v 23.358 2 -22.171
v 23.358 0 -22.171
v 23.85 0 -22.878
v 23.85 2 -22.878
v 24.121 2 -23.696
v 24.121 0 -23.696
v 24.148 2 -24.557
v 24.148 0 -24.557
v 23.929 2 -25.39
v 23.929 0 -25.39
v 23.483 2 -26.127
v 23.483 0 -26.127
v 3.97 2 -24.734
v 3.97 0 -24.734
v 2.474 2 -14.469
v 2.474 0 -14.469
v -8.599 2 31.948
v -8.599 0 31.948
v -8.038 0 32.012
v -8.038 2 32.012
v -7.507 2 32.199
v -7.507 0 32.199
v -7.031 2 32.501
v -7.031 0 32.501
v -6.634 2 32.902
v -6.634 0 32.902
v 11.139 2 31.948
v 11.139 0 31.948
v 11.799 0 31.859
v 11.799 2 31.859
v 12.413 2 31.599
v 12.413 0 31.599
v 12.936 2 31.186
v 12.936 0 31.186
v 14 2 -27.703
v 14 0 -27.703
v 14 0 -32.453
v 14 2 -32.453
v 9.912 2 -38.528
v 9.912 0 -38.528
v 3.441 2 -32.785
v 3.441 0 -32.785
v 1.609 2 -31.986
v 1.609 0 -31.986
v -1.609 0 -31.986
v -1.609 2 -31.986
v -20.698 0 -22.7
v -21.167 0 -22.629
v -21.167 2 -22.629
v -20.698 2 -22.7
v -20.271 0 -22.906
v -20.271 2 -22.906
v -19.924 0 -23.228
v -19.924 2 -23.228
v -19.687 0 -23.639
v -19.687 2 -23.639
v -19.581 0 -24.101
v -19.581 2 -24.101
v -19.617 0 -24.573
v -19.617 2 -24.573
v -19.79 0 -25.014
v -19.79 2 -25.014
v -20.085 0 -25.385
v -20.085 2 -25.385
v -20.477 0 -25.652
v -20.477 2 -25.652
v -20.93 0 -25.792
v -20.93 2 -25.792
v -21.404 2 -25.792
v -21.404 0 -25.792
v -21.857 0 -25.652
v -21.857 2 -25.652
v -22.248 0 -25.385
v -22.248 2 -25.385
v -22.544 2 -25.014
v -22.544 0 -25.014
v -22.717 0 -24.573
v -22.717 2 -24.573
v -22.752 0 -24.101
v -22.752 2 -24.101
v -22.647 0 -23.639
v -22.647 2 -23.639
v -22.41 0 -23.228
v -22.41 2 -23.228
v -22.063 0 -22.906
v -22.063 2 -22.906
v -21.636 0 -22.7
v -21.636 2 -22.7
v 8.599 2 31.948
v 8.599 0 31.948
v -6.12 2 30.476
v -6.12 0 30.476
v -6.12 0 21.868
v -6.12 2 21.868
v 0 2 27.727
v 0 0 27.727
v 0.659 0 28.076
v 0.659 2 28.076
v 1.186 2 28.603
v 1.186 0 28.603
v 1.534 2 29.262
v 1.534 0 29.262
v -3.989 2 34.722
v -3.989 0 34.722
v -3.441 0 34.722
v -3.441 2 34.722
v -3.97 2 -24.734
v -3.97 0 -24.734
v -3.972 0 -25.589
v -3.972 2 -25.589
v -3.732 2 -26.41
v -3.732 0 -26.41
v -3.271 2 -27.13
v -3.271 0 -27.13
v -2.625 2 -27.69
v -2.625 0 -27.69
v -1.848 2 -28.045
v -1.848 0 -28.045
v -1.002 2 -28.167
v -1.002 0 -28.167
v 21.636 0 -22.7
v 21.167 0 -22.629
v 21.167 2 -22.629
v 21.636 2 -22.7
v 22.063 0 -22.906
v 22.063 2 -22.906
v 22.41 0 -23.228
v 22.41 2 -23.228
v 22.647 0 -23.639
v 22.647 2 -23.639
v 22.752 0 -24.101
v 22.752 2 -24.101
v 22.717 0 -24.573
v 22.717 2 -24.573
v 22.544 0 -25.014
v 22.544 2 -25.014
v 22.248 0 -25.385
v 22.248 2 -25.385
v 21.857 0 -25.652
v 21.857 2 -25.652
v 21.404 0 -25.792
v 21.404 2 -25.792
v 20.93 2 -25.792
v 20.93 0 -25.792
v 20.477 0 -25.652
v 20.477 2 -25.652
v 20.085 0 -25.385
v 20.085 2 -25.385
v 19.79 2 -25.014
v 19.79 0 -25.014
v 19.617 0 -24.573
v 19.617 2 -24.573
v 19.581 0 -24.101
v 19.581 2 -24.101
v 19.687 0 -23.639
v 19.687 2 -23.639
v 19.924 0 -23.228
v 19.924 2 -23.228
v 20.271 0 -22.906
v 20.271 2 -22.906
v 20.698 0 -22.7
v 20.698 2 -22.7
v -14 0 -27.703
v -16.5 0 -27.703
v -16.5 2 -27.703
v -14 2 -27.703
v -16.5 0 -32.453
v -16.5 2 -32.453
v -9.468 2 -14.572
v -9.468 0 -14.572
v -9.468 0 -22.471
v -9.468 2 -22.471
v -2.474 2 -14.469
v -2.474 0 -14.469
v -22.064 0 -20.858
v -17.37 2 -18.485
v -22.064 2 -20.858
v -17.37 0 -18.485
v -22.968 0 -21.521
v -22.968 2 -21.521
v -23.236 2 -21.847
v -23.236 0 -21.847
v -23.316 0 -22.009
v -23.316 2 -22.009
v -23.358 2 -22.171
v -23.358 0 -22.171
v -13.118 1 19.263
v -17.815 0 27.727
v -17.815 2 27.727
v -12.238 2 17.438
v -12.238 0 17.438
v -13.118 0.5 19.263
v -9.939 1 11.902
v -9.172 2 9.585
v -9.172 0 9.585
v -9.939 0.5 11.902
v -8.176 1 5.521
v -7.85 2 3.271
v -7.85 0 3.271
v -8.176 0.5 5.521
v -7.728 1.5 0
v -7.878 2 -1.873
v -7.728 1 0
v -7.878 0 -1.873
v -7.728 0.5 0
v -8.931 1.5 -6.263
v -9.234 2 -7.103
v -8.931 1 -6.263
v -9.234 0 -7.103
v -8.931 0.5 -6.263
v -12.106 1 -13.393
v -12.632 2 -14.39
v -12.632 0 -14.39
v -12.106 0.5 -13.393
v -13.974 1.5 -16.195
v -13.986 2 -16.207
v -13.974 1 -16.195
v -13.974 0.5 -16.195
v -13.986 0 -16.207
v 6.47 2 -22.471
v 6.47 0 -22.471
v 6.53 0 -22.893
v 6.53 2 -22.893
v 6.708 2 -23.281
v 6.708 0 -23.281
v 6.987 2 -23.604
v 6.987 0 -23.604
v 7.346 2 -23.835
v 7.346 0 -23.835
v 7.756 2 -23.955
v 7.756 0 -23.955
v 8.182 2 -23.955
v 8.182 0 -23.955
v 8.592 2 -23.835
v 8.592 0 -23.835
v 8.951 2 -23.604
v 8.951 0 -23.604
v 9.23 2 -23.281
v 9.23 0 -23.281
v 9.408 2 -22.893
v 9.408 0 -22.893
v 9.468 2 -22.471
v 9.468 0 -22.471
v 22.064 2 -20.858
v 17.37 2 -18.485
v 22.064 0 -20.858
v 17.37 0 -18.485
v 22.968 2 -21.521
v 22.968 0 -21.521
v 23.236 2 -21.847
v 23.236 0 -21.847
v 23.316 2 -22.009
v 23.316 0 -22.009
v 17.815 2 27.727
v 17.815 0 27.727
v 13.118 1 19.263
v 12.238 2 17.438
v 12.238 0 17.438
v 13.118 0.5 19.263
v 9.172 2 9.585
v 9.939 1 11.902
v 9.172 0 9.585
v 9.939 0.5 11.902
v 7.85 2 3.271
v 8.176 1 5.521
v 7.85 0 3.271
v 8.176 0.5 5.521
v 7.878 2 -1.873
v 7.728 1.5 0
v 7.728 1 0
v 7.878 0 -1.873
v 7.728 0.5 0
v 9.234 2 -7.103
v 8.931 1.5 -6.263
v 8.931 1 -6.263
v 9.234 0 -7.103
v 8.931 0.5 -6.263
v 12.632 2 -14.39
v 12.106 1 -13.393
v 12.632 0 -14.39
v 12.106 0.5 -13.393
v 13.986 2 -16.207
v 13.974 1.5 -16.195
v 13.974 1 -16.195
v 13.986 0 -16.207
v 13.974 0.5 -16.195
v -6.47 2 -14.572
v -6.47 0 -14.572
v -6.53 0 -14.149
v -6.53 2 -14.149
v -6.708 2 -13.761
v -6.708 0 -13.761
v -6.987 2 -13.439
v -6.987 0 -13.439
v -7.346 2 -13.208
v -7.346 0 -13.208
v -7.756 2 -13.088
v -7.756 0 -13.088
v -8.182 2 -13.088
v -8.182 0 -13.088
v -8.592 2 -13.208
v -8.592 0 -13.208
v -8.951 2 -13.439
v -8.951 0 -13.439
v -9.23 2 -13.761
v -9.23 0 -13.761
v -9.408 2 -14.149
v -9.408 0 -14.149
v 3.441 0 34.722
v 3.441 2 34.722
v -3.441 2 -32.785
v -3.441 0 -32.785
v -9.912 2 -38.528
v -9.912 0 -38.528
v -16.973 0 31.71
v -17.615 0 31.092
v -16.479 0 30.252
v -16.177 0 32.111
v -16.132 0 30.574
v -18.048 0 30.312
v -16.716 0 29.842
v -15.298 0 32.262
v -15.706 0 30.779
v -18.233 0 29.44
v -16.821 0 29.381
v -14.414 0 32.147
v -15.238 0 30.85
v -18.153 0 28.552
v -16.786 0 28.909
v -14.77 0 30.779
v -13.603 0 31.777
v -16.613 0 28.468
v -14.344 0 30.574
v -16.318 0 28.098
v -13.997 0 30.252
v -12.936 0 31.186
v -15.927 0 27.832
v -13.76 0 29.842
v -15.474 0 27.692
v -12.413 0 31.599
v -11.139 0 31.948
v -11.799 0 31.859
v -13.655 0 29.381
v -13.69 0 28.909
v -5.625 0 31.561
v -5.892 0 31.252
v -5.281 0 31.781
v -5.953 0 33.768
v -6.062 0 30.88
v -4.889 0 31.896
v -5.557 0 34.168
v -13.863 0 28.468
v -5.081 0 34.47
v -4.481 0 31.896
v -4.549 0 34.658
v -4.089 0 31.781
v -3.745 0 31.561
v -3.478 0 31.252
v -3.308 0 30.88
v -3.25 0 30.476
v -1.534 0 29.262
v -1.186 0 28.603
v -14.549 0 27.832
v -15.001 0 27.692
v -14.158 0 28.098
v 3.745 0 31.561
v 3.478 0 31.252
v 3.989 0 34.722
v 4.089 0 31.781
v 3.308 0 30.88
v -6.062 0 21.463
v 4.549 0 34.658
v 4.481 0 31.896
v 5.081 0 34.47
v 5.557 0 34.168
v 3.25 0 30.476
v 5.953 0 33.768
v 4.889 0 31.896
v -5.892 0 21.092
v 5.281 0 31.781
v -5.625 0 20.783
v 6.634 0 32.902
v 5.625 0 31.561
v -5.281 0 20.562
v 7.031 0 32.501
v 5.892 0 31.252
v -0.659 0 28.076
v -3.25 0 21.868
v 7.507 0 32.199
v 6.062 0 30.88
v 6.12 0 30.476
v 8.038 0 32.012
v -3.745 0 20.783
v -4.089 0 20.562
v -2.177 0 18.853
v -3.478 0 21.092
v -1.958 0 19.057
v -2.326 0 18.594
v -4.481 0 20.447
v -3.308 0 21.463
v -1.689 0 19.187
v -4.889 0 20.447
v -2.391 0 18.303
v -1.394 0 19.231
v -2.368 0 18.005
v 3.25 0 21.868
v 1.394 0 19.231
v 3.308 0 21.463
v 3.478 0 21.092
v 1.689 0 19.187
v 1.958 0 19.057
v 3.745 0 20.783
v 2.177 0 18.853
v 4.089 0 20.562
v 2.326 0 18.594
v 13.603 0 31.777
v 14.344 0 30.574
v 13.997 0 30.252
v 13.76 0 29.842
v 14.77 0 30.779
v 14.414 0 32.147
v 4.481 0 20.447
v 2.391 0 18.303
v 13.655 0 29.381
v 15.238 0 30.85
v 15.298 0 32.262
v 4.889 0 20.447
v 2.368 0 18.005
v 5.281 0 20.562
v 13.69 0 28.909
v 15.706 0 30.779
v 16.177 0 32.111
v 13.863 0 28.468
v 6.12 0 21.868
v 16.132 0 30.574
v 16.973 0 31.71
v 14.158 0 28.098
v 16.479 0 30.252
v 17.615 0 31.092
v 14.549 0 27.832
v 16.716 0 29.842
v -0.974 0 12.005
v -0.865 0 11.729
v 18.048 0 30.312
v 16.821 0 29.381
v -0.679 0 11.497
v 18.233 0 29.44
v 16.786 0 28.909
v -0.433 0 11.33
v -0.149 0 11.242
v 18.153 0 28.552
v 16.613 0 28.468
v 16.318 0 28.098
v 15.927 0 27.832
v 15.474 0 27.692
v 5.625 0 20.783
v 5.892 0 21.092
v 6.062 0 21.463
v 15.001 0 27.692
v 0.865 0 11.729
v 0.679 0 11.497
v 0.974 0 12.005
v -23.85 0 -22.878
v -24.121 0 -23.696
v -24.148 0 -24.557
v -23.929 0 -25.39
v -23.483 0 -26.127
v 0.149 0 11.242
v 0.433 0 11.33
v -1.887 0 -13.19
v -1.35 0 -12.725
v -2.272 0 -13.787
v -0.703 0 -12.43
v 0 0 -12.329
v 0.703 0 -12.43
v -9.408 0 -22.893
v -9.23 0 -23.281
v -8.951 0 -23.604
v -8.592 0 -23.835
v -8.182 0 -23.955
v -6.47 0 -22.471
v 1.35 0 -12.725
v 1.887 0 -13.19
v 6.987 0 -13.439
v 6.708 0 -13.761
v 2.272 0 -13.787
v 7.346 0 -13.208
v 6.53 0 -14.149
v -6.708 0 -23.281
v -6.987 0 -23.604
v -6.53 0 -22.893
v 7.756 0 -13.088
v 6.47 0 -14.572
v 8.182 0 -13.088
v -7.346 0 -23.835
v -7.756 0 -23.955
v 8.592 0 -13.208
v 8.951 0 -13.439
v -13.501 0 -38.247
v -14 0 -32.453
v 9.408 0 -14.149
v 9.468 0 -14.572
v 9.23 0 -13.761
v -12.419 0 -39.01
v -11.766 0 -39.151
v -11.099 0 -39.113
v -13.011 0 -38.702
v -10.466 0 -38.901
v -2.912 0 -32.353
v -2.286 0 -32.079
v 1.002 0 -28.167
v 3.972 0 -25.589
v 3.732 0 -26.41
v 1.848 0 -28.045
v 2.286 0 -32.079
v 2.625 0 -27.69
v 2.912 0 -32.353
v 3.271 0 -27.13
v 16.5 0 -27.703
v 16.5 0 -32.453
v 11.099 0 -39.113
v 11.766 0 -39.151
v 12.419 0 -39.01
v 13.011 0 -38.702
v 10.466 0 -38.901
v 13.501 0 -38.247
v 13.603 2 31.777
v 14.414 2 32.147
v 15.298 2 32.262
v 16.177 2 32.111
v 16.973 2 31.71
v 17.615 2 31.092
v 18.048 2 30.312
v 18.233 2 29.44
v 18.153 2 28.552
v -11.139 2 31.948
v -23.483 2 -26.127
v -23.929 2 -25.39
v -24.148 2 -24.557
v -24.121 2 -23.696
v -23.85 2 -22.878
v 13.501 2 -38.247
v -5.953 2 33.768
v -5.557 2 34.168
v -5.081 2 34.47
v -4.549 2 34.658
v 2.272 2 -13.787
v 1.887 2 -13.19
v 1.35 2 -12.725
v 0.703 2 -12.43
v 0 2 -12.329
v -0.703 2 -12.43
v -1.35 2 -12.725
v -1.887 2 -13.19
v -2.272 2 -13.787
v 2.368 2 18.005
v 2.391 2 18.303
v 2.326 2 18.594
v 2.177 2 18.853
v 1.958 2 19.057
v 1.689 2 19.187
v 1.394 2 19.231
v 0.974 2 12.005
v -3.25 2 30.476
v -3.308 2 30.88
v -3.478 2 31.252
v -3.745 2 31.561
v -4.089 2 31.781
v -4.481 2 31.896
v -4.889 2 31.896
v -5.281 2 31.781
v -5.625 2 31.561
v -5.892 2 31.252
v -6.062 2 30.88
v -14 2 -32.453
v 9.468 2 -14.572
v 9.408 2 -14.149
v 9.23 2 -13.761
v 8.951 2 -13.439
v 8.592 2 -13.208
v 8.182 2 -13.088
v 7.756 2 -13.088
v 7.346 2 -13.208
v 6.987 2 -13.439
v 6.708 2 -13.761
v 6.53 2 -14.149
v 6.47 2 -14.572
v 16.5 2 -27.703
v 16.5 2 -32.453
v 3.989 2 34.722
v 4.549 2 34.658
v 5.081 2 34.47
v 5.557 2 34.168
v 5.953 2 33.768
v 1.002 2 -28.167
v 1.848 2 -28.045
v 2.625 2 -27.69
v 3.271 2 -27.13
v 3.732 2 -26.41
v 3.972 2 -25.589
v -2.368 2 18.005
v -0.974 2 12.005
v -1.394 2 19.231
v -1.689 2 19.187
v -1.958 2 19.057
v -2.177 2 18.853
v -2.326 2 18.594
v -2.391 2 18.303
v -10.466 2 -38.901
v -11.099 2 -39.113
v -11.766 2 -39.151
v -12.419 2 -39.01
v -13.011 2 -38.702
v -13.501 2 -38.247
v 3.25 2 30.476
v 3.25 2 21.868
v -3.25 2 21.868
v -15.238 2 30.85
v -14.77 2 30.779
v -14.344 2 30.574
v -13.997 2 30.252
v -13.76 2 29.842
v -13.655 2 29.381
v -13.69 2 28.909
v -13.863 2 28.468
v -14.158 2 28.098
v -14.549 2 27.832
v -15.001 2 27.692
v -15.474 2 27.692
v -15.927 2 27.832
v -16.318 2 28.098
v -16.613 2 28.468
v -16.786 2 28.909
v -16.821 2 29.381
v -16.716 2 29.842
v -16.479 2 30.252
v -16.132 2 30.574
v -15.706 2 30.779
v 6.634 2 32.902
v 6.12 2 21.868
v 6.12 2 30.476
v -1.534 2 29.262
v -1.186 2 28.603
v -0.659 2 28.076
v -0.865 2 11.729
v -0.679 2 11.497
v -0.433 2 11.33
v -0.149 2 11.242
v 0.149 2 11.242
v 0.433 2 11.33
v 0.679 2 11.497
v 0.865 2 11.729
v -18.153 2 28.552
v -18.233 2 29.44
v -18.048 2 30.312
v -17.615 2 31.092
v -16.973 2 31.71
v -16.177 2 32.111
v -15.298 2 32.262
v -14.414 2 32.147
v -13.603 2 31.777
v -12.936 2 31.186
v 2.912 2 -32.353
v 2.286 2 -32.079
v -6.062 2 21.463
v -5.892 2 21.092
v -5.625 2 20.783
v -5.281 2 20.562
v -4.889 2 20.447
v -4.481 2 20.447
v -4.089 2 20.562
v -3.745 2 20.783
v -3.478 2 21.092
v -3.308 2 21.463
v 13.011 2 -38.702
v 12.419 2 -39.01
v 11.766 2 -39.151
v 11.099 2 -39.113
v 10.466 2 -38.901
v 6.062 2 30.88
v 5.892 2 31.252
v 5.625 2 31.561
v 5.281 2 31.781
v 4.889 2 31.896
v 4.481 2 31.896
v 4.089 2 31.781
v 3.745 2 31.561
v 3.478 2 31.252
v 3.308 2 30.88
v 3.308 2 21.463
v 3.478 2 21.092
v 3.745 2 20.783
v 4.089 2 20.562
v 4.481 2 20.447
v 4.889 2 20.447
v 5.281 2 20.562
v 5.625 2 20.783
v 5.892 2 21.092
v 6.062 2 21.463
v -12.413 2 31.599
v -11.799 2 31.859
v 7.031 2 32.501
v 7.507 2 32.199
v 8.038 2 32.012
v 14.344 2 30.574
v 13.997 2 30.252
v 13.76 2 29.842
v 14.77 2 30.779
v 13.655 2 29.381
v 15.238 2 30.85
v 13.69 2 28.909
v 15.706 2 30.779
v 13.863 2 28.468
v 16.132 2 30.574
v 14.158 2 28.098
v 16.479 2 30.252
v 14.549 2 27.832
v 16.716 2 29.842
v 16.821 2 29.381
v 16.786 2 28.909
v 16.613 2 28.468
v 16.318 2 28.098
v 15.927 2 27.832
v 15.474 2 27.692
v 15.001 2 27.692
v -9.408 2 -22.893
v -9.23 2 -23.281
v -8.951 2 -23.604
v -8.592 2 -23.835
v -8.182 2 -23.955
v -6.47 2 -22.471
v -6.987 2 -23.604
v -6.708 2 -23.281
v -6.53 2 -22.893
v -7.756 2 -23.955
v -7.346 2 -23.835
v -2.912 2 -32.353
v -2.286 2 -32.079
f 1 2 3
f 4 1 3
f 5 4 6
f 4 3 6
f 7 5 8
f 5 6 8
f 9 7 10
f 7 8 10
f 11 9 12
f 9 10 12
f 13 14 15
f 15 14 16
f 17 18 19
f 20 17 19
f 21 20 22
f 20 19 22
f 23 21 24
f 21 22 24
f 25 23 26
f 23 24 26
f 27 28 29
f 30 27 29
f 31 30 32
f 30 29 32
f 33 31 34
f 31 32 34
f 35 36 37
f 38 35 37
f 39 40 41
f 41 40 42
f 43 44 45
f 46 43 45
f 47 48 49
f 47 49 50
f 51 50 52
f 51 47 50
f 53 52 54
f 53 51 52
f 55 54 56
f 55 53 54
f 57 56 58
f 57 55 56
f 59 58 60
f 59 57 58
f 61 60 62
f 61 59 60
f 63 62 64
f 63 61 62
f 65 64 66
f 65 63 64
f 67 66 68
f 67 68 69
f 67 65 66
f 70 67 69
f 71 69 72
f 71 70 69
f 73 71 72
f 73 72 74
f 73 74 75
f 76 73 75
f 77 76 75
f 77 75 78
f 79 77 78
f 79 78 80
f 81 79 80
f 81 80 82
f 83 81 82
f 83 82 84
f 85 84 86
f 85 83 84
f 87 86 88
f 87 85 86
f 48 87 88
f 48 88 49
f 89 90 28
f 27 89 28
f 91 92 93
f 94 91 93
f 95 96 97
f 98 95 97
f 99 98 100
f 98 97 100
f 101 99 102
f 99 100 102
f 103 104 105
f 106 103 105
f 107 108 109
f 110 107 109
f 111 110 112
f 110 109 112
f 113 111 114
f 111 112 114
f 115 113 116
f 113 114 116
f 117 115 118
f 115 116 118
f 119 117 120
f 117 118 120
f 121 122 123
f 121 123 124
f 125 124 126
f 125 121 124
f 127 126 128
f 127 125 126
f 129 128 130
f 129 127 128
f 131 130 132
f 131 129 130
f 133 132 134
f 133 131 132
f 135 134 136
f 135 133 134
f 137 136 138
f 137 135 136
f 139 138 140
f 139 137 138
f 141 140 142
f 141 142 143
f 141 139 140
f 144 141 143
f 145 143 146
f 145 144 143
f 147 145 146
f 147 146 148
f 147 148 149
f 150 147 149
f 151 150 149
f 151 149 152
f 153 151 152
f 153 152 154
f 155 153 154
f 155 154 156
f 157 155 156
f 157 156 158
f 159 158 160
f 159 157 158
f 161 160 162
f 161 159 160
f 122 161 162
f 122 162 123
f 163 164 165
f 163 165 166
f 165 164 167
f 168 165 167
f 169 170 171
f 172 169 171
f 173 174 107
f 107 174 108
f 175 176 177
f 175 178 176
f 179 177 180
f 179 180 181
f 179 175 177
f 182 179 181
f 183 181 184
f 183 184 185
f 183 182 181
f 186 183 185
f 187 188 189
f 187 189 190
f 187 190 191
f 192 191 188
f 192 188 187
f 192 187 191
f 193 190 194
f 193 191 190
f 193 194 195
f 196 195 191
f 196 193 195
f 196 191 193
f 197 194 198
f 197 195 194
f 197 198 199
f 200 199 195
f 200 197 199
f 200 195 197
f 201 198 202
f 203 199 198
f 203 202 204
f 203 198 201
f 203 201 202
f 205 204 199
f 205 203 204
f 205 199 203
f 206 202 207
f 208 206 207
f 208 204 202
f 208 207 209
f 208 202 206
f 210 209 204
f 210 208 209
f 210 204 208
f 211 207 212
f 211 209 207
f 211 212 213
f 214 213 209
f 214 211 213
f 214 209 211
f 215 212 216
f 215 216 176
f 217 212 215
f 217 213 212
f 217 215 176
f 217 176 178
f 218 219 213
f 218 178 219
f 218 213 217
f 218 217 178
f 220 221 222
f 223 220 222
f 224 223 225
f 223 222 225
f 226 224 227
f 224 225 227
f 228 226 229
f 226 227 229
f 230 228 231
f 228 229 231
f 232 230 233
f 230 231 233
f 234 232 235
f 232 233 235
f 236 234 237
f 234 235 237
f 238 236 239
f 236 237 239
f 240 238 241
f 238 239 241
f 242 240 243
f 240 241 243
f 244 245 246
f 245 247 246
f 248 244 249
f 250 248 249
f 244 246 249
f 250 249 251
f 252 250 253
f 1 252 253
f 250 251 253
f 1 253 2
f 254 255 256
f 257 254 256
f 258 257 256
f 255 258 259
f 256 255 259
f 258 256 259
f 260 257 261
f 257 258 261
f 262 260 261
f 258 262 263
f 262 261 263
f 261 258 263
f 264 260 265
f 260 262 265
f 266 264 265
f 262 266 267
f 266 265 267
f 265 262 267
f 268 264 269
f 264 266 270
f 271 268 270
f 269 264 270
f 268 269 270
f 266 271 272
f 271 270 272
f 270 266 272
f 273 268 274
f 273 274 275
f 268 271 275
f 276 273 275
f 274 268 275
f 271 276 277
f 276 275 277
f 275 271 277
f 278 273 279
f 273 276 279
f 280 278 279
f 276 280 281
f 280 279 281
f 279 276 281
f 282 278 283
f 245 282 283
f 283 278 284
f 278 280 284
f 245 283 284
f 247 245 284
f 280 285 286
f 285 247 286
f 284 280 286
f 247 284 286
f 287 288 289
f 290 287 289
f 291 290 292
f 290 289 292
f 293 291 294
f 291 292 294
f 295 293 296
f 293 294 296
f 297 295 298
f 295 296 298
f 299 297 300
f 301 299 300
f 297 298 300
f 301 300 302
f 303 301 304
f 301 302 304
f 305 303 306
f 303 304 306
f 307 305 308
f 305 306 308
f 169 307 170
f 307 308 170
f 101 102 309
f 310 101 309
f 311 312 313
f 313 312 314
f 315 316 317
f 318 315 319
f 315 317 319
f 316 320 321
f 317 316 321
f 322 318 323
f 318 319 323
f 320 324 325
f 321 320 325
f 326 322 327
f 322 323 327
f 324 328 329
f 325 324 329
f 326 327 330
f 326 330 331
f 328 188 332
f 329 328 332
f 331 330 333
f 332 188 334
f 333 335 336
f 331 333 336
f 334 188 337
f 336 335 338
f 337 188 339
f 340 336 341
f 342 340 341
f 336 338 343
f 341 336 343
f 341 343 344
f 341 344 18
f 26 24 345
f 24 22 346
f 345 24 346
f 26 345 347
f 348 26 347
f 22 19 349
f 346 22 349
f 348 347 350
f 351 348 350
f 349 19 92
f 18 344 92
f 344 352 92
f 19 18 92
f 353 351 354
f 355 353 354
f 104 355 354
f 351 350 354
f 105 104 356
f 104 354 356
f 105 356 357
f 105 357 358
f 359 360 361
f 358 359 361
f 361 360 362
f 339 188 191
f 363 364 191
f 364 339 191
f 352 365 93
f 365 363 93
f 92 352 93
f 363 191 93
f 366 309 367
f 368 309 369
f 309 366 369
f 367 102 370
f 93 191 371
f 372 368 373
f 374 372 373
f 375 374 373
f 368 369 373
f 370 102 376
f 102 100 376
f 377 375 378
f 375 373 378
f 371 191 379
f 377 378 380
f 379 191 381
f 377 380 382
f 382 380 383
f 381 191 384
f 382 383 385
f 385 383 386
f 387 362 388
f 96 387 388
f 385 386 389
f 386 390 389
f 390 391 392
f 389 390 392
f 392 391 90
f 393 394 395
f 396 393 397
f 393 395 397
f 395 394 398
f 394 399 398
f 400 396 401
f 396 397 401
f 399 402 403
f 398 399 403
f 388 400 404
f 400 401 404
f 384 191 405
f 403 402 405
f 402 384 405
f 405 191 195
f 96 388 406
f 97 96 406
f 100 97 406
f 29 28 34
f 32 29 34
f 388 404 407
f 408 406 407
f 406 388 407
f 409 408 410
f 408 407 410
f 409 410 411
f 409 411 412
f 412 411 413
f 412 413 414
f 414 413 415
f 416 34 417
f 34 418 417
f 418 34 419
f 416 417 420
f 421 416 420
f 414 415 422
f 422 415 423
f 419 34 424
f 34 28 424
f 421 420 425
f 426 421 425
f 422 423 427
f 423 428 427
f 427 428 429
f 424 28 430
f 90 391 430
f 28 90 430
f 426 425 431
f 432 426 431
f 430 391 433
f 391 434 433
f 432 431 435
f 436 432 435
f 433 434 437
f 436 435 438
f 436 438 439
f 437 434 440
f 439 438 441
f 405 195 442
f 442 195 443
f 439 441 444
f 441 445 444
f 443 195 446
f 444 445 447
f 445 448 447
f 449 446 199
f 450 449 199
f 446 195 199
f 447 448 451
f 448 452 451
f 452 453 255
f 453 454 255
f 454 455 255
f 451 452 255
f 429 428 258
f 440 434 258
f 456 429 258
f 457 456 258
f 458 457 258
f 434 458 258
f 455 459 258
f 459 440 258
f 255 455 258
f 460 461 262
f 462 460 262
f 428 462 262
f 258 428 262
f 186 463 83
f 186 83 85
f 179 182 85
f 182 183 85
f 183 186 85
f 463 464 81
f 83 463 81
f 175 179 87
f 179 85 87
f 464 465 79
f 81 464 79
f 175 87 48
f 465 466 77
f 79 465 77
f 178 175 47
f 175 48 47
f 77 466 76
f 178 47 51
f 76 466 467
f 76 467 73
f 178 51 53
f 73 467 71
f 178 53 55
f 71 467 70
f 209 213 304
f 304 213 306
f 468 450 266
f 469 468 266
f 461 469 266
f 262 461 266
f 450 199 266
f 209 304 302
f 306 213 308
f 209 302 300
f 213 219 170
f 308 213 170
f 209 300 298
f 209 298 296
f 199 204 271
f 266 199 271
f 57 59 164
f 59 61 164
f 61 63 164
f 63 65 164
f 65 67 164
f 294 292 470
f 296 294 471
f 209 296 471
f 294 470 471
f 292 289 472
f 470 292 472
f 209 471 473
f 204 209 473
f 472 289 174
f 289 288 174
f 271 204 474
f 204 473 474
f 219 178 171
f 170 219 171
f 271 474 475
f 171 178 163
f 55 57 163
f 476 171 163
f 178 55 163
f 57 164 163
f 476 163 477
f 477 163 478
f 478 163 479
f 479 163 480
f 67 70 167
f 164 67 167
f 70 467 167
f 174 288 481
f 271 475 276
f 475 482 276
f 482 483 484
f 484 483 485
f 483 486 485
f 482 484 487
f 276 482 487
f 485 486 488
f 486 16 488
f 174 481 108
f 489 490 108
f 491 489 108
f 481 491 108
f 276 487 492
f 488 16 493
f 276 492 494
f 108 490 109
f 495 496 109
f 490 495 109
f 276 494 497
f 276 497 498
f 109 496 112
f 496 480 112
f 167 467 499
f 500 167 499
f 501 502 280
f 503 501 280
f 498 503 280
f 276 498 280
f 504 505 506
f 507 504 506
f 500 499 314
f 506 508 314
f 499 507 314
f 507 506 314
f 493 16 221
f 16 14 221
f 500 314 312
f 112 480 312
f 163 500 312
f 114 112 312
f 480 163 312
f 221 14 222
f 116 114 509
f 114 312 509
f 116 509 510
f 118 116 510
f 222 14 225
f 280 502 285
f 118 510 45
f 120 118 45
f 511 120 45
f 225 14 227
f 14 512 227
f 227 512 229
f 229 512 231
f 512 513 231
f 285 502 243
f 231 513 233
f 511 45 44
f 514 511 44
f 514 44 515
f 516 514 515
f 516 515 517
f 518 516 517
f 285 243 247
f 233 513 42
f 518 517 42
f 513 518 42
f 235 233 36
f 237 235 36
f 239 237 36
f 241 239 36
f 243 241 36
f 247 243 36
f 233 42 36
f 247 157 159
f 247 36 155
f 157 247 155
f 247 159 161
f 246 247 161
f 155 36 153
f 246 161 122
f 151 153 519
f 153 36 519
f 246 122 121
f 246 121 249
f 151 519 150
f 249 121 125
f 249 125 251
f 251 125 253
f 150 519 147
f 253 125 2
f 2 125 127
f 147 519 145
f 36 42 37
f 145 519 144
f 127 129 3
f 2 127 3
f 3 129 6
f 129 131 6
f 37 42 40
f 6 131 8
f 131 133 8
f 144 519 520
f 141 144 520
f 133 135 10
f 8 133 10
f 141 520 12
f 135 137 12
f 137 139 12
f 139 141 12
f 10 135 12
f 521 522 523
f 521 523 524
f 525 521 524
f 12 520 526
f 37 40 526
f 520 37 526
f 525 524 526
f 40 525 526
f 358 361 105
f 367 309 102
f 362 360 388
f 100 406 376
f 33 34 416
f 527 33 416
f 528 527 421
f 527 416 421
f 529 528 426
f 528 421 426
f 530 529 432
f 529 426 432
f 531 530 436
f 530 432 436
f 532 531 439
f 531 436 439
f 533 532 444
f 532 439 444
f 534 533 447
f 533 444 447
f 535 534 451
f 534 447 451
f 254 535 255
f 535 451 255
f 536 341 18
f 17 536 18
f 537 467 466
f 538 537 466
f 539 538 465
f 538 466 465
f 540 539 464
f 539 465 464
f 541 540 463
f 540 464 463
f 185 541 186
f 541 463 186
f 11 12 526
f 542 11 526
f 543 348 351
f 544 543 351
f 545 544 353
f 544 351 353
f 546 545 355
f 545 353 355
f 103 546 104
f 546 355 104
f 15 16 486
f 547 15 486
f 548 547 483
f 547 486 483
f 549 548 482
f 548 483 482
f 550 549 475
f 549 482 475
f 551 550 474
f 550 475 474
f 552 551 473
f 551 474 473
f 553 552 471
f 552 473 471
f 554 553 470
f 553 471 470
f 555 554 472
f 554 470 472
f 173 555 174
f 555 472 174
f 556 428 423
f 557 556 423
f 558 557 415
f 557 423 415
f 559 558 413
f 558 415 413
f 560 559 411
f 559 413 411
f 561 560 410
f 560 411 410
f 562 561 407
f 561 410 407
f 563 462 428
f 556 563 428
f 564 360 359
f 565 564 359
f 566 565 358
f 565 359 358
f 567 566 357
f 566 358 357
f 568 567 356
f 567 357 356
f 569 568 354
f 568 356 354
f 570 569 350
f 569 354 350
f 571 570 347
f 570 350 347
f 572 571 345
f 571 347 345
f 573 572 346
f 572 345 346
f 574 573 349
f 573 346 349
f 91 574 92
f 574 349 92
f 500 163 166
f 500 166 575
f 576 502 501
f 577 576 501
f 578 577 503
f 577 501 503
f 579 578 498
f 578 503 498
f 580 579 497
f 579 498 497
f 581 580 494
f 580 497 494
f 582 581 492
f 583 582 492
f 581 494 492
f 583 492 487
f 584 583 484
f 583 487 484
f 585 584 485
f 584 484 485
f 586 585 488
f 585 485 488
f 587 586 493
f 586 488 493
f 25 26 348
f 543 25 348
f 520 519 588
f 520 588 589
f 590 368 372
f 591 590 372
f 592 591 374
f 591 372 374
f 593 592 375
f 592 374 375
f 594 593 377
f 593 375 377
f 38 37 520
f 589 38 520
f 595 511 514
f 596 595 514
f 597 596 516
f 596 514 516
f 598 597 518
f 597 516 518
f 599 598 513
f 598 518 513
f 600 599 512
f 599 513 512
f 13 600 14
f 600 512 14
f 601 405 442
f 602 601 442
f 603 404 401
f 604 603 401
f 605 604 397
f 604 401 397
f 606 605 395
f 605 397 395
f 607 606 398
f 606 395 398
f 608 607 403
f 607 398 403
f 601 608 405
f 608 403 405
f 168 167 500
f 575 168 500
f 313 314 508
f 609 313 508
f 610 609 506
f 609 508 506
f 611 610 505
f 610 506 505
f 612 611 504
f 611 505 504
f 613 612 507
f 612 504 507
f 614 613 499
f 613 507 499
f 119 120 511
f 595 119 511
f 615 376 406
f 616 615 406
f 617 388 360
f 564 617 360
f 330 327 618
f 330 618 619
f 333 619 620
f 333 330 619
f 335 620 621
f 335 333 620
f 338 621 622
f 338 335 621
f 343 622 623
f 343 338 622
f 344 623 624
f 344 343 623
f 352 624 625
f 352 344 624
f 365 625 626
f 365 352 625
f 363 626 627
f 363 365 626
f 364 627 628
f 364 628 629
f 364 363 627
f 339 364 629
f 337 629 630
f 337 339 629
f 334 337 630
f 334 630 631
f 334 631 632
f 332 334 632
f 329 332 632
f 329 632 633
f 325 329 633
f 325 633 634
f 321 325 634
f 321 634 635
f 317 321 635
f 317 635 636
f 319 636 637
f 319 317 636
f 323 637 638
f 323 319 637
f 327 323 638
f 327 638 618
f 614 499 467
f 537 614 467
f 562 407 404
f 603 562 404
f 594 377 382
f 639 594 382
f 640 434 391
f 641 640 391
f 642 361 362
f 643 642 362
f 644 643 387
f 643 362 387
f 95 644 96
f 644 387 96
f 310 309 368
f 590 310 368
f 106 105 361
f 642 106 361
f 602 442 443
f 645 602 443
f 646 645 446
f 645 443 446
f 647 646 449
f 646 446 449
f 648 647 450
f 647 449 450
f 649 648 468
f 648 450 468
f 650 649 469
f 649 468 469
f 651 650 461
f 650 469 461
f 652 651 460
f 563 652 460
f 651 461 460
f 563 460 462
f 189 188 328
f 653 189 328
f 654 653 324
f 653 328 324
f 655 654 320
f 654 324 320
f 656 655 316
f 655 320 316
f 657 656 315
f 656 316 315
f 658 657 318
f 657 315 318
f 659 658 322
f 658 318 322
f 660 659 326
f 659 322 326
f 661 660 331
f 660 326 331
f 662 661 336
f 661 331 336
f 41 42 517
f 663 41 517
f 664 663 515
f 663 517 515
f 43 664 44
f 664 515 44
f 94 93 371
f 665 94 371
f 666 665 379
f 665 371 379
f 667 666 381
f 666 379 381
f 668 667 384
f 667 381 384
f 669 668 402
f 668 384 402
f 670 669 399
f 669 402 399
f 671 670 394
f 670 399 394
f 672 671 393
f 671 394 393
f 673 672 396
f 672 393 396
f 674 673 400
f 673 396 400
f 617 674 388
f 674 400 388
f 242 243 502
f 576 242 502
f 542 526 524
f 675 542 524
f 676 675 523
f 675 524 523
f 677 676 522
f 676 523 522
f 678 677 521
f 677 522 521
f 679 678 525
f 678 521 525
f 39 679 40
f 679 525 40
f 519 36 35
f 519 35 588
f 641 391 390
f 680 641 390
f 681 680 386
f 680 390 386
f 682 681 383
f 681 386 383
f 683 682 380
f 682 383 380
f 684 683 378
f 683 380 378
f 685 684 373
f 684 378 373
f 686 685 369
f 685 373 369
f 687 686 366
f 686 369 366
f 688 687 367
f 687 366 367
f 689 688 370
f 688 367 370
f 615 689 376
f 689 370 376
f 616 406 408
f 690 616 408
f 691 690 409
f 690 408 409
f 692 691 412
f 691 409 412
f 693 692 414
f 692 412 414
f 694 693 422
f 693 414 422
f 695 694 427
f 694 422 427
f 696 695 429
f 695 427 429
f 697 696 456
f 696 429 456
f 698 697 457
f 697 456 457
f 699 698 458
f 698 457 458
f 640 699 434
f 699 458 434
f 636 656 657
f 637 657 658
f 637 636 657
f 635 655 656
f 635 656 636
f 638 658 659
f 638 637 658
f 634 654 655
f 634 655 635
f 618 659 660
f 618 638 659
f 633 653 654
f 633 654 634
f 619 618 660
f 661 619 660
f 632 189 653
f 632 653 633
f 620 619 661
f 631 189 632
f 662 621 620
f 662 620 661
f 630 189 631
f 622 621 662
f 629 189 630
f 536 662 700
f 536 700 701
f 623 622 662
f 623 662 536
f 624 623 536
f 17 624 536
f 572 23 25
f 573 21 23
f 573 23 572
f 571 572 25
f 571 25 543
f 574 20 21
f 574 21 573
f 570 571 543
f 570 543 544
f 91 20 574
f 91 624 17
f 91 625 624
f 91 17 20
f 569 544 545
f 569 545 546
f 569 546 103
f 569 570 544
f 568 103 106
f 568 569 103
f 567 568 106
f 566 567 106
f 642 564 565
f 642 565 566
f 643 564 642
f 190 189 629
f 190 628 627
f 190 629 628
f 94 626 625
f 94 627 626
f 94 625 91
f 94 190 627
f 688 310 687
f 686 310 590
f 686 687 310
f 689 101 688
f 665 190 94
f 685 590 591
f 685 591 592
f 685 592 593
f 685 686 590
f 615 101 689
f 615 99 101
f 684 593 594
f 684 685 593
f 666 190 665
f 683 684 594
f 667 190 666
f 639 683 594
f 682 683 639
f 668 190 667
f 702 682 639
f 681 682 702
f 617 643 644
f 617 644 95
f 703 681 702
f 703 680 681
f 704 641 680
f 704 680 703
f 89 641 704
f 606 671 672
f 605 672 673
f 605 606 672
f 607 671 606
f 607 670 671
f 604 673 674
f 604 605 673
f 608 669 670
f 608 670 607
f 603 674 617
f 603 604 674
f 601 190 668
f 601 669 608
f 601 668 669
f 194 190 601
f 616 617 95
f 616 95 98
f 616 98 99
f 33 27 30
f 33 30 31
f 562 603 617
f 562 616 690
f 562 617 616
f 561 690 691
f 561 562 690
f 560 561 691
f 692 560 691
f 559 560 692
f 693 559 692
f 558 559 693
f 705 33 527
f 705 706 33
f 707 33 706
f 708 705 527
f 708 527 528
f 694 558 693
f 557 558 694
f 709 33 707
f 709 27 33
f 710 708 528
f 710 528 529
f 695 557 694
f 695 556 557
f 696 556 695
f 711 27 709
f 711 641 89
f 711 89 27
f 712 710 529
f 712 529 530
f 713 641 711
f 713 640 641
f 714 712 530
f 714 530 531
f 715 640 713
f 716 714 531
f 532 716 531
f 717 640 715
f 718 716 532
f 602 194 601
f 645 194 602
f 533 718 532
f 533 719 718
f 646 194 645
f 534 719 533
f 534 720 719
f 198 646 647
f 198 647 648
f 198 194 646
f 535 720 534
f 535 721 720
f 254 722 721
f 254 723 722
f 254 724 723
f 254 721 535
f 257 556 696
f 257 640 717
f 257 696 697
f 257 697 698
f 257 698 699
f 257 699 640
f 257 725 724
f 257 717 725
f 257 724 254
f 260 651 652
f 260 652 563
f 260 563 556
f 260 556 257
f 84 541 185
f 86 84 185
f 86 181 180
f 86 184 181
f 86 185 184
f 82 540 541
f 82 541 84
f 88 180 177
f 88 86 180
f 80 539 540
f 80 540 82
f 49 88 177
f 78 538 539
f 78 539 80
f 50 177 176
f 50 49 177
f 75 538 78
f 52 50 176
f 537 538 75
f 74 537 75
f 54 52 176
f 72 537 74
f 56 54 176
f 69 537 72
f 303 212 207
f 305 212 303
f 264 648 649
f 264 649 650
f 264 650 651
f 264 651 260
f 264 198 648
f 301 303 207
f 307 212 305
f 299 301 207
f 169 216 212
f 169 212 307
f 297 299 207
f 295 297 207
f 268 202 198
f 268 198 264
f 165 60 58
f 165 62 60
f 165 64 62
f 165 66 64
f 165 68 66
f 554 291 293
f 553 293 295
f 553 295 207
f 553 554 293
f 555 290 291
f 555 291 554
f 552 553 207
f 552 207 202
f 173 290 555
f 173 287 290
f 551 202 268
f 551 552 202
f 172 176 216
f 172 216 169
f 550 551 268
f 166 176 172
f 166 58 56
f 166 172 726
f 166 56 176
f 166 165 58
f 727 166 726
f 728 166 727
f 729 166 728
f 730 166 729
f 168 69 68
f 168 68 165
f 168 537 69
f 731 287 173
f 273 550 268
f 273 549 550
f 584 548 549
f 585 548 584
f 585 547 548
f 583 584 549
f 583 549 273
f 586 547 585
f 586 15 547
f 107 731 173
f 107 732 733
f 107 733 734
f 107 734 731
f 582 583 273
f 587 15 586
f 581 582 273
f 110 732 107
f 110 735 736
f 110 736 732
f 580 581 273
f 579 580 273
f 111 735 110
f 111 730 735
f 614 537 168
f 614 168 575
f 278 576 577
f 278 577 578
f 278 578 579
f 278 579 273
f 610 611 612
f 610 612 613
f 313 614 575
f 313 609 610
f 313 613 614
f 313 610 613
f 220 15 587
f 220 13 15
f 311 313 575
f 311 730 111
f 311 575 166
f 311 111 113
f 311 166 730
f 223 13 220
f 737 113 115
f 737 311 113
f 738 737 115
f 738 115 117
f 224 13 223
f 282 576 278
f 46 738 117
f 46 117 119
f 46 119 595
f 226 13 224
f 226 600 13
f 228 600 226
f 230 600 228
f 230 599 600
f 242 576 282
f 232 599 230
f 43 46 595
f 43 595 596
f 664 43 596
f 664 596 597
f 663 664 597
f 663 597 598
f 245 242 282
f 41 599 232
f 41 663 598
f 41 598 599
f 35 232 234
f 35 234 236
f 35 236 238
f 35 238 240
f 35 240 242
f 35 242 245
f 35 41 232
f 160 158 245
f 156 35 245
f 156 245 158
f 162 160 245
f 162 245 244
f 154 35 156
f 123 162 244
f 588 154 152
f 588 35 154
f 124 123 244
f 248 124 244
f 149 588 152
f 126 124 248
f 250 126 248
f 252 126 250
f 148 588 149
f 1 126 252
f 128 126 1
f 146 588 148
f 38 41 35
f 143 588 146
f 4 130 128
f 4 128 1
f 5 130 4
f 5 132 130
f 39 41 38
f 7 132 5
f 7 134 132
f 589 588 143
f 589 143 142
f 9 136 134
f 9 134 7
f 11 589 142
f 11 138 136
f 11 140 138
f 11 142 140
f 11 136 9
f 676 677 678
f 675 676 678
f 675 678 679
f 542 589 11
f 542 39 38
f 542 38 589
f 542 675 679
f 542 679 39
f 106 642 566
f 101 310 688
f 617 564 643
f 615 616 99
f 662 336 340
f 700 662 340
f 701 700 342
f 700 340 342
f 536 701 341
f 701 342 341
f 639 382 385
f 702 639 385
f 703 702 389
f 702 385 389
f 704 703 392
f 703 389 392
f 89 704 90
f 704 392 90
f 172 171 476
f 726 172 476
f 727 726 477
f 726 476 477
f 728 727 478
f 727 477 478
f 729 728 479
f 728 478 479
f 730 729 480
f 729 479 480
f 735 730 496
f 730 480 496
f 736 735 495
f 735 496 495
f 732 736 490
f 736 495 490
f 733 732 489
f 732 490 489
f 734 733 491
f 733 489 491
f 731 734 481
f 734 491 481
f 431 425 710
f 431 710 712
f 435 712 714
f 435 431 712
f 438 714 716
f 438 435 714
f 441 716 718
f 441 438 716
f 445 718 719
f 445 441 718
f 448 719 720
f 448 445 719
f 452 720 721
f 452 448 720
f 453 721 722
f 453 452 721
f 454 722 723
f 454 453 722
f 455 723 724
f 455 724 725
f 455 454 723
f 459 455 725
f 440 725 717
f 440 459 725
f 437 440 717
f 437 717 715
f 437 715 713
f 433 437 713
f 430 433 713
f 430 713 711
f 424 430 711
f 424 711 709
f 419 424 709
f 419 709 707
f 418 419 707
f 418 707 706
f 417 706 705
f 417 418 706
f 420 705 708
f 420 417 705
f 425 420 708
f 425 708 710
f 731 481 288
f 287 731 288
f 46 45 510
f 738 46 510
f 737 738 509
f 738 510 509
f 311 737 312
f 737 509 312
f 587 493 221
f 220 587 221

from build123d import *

# Parameters (mm, degrees)
CROQUIS1_R              = 1.5875
CROQUIS1_R_2            = 1.59
CROQUIS1_W              = 2.5
CROQUIS1_H              = 4.75
SALIENTE_EXTRUIR2_DEPTH = 2


with BuildPart() as part:
    # Croquis1 → Saliente-Extruir2 (new body)
    with BuildSketch(Plane(origin=(0, 0, 0), x_dir=(1, 0, 0), z_dir=(0, 1, 0))):
        with BuildLine():
            Line((-13.500997661, 38.247470948), (-23.48270506, 26.126508519))
            ThreePointArc((-23.48270506, 26.126508519), (-24.165408731, 24.125159739), (-23.358354505, 22.170640687))
            add(Edge.make_bspline(
                [(-17.815436951, -27.727159764), (-10.494709665, -15.652410543), (-5.589282311, -1.253212627), (-9.575431127, 8.497808826), (-14.681470714, 18.410285079), (-23.136242341, 20.540450982), (-23.358354505, 22.170640687)],
                knots=[0, 0, 0, 0, 0.481002384, 0.786245044, 0.838144806, 1, 1, 1, 1], degree=3))
            ThreePointArc((-17.815436951, -27.727159764), (-16.972773026, -31.709582726), (-12.935985799, -31.186014181))
            ThreePointArc((-12.935985799, -31.186014181), (-12.114820717, -31.749834132), (-11.138692552, -31.948275137))
            Line((-11.138692552, -31.948275137), (-8.598739942, -31.948275137))
            ThreePointArc((-8.598739942, -31.948275137), (-7.506720993, -32.19938772), (-6.634077803, -32.902279446))
            Line((-6.634077803, -32.902279446), (-5.953226574, -33.767509951))
            ThreePointArc((-5.953226574, -33.767509951), (-5.080583384, -34.470401676), (-3.988564435, -34.721514259))
            Line((-3.988564435, -34.721514259), (-3.441216411, -34.721514259))
            Line((-3.441216411, -34.721514259), (-1.533856825, -29.262119003))
            ThreePointArc((-1.533856825, -29.262119003), (-0.942151005, -28.319542636), (0, -27.727159764))
            ThreePointArc((0, -27.727159764), (0.942151005, -28.319542636), (1.533856825, -29.262119003))
            Line((1.533856825, -29.262119003), (3.441216411, -34.721514259))
            Line((3.441216411, -34.721514259), (3.988564435, -34.721514259))
            ThreePointArc((3.988564435, -34.721514259), (5.080583384, -34.470401676), (5.953226574, -33.767509951))
            Line((5.953226574, -33.767509951), (6.634077803, -32.902279446))
            ThreePointArc((6.634077803, -32.902279446), (7.506720993, -32.19938772), (8.598739942, -31.948275137))
            Line((8.598739942, -31.948275137), (11.138692552, -31.948275137))
            ThreePointArc((11.138692552, -31.948275137), (12.114820717, -31.749834132), (12.935985799, -31.186014181))
            ThreePointArc((12.935985799, -31.186014181), (16.972773026, -31.709582726), (17.815436951, -27.727159764))
            add(Edge.make_bspline(
                [(17.815436951, -27.727159764), (10.494709665, -15.652410543), (5.589282311, -1.253212627), (9.575431127, 8.497808826), (14.681470714, 18.410285079), (23.136242341, 20.540450982), (23.358354505, 22.170640687)],
                knots=[0, 0, 0, 0, 0.481002384, 0.786245044, 0.838144806, 1, 1, 1, 1], degree=3))
            ThreePointArc((23.358354505, 22.170640687), (24.165408731, 24.125159739), (23.48270506, 26.126508519))
            Line((23.48270506, 26.126508519), (13.500997661, 38.247470948))
            ThreePointArc((13.500997661, 38.247470948), (11.765956158, 39.150626323), (9.911661286, 38.528011532))
            Line((9.911661286, 38.528011532), (3.441216411, 32.785293976))
            ThreePointArc((3.441216411, 32.785293976), (2.608431822, 32.194596441), (1.608939272, 31.986105691))
            Line((1.608939272, 31.986105691), (0.563987286, 31.986105691))
            Line((0.563987286, 31.986105691), (-0.563987286, 31.986105691))
            Line((-0.563987286, 31.986105691), (-1.608939272, 31.986105691))
            ThreePointArc((-1.608939272, 31.986105691), (-2.608431822, 32.194596441), (-3.441216411, 32.785293976))
            Line((-3.441216411, 32.785293976), (-9.911661286, 38.528011532))
            ThreePointArc((-9.911661286, 38.528011532), (-11.765956158, 39.150626323), (-13.500997661, 38.247470948))
        make_face()
        with Locations(Location((-15.237860544, -29.262119003, 0), (0, 0, 270))):
            Circle(CROQUIS1_R, mode=Mode.SUBTRACT)
        with BuildLine():
            ThreePointArc((-6.119798022, -21.867659367), (-4.684765235, -20.432626581), (-3.249732449, -21.867659367))
            Line((-3.249732449, -21.867659367), (-3.249732449, -30.47604675))
            ThreePointArc((-3.249732449, -30.47604675), (-4.684765235, -31.911079536), (-6.119798022, -30.47604675))
            Line((-6.119798022, -30.47604675), (-6.119798022, -21.867659367))
        make_face(mode=Mode.SUBTRACT)
        with BuildLine():
            Line((3.249732449, -30.47604675), (3.249732449, -21.867659367))
            ThreePointArc((3.249732449, -21.867659367), (4.684765235, -20.432626581), (6.119798022, -21.867659367))
            Line((6.119798022, -21.867659367), (6.119798022, -30.47604675))
            ThreePointArc((6.119798022, -30.47604675), (4.684765235, -31.911079536), (3.249732449, -30.47604675))
        make_face(mode=Mode.SUBTRACT)
        with Locations(Location((15.237860544, -29.262119003, 0), (0, 0, 270))):
            Circle(CROQUIS1_R, mode=Mode.SUBTRACT)
        with BuildLine():
            Line((-2.367884319, -18.005103727), (-0.974062699, -12.005103727))
            ThreePointArc((-0.974062699, -12.005103727), (0, -11.231382002), (0.974062699, -12.005103727))
            Line((0.974062699, -12.005103727), (2.367884319, -18.005103727))
            ThreePointArc((2.367884319, -18.005103727), (2.176853635, -18.853363403), (1.39382162, -19.231382002))
            Line((1.39382162, -19.231382002), (0.763866627, -19.231382002))
            Line((0.763866627, -19.231382002), (-0.763866627, -19.231382002))
            Line((-0.763866627, -19.231382002), (-1.39382162, -19.231382002))
            ThreePointArc((-1.39382162, -19.231382002), (-2.176853635, -18.853363403), (-2.367884319, -18.005103727))
        make_face(mode=Mode.SUBTRACT)
        with BuildLine():
            ThreePointArc((-9.468375509, 22.47076229), (-7.969046344, 23.970091456), (-6.469717178, 22.47076229))
            Line((-6.469717178, 22.47076229), (-6.469717178, 14.571803083))
            ThreePointArc((-6.469717178, 14.571803083), (-7.969046344, 13.072473917), (-9.468375509, 14.571803083))
            Line((-9.468375509, 14.571803083), (-9.468375509, 22.47076229))
        make_face(mode=Mode.SUBTRACT)
        with BuildLine():
            ThreePointArc((-3.970426322, 24.734392618), (-3.270984433, 27.12952489), (-1.001806653, 28.16717115))
            Line((-1.001806653, 28.16717115), (1.001806653, 28.16717115))
            ThreePointArc((1.001806653, 28.16717115), (3.270984433, 27.12952489), (3.970426322, 24.734392618))
            Line((3.970426322, 24.734392618), (2.473849725, 14.468710767))
            ThreePointArc((2.473849725, 14.468710767), (0, 12.329359543), (-2.473849725, 14.468710767))
            Line((-2.473849725, 14.468710767), (-3.970426322, 24.734392618))
        make_face(mode=Mode.SUBTRACT)
        with Locations(Location((-21.166889821, 24.21941655, 0), (0, 0, 270))):
            Circle(CROQUIS1_R_2, mode=Mode.SUBTRACT)
        with Locations((-15.25, 30.078133807)):
            Rectangle(CROQUIS1_W, CROQUIS1_H, mode=Mode.SUBTRACT)
        with BuildLine():
            Line((6.469717178, 14.571803083), (6.469717178, 22.47076229))
            ThreePointArc((6.469717178, 22.47076229), (7.969046344, 23.970091456), (9.468375509, 22.47076229))
            Line((9.468375509, 22.47076229), (9.468375509, 14.571803083))
            ThreePointArc((9.468375509, 14.571803083), (7.969046344, 13.072473917), (6.469717178, 14.571803083))
        make_face(mode=Mode.SUBTRACT)
        with Locations(Location((21.166889821, 24.21941655, 0), (0, 0, 270))):
            Circle(CROQUIS1_R_2, mode=Mode.SUBTRACT)
        with Locations((15.25, 30.078133807)):
            Rectangle(CROQUIS1_W, CROQUIS1_H, mode=Mode.SUBTRACT)
    extrude(amount=SALIENTE_EXTRUIR2_DEPTH)


solid = part.part
